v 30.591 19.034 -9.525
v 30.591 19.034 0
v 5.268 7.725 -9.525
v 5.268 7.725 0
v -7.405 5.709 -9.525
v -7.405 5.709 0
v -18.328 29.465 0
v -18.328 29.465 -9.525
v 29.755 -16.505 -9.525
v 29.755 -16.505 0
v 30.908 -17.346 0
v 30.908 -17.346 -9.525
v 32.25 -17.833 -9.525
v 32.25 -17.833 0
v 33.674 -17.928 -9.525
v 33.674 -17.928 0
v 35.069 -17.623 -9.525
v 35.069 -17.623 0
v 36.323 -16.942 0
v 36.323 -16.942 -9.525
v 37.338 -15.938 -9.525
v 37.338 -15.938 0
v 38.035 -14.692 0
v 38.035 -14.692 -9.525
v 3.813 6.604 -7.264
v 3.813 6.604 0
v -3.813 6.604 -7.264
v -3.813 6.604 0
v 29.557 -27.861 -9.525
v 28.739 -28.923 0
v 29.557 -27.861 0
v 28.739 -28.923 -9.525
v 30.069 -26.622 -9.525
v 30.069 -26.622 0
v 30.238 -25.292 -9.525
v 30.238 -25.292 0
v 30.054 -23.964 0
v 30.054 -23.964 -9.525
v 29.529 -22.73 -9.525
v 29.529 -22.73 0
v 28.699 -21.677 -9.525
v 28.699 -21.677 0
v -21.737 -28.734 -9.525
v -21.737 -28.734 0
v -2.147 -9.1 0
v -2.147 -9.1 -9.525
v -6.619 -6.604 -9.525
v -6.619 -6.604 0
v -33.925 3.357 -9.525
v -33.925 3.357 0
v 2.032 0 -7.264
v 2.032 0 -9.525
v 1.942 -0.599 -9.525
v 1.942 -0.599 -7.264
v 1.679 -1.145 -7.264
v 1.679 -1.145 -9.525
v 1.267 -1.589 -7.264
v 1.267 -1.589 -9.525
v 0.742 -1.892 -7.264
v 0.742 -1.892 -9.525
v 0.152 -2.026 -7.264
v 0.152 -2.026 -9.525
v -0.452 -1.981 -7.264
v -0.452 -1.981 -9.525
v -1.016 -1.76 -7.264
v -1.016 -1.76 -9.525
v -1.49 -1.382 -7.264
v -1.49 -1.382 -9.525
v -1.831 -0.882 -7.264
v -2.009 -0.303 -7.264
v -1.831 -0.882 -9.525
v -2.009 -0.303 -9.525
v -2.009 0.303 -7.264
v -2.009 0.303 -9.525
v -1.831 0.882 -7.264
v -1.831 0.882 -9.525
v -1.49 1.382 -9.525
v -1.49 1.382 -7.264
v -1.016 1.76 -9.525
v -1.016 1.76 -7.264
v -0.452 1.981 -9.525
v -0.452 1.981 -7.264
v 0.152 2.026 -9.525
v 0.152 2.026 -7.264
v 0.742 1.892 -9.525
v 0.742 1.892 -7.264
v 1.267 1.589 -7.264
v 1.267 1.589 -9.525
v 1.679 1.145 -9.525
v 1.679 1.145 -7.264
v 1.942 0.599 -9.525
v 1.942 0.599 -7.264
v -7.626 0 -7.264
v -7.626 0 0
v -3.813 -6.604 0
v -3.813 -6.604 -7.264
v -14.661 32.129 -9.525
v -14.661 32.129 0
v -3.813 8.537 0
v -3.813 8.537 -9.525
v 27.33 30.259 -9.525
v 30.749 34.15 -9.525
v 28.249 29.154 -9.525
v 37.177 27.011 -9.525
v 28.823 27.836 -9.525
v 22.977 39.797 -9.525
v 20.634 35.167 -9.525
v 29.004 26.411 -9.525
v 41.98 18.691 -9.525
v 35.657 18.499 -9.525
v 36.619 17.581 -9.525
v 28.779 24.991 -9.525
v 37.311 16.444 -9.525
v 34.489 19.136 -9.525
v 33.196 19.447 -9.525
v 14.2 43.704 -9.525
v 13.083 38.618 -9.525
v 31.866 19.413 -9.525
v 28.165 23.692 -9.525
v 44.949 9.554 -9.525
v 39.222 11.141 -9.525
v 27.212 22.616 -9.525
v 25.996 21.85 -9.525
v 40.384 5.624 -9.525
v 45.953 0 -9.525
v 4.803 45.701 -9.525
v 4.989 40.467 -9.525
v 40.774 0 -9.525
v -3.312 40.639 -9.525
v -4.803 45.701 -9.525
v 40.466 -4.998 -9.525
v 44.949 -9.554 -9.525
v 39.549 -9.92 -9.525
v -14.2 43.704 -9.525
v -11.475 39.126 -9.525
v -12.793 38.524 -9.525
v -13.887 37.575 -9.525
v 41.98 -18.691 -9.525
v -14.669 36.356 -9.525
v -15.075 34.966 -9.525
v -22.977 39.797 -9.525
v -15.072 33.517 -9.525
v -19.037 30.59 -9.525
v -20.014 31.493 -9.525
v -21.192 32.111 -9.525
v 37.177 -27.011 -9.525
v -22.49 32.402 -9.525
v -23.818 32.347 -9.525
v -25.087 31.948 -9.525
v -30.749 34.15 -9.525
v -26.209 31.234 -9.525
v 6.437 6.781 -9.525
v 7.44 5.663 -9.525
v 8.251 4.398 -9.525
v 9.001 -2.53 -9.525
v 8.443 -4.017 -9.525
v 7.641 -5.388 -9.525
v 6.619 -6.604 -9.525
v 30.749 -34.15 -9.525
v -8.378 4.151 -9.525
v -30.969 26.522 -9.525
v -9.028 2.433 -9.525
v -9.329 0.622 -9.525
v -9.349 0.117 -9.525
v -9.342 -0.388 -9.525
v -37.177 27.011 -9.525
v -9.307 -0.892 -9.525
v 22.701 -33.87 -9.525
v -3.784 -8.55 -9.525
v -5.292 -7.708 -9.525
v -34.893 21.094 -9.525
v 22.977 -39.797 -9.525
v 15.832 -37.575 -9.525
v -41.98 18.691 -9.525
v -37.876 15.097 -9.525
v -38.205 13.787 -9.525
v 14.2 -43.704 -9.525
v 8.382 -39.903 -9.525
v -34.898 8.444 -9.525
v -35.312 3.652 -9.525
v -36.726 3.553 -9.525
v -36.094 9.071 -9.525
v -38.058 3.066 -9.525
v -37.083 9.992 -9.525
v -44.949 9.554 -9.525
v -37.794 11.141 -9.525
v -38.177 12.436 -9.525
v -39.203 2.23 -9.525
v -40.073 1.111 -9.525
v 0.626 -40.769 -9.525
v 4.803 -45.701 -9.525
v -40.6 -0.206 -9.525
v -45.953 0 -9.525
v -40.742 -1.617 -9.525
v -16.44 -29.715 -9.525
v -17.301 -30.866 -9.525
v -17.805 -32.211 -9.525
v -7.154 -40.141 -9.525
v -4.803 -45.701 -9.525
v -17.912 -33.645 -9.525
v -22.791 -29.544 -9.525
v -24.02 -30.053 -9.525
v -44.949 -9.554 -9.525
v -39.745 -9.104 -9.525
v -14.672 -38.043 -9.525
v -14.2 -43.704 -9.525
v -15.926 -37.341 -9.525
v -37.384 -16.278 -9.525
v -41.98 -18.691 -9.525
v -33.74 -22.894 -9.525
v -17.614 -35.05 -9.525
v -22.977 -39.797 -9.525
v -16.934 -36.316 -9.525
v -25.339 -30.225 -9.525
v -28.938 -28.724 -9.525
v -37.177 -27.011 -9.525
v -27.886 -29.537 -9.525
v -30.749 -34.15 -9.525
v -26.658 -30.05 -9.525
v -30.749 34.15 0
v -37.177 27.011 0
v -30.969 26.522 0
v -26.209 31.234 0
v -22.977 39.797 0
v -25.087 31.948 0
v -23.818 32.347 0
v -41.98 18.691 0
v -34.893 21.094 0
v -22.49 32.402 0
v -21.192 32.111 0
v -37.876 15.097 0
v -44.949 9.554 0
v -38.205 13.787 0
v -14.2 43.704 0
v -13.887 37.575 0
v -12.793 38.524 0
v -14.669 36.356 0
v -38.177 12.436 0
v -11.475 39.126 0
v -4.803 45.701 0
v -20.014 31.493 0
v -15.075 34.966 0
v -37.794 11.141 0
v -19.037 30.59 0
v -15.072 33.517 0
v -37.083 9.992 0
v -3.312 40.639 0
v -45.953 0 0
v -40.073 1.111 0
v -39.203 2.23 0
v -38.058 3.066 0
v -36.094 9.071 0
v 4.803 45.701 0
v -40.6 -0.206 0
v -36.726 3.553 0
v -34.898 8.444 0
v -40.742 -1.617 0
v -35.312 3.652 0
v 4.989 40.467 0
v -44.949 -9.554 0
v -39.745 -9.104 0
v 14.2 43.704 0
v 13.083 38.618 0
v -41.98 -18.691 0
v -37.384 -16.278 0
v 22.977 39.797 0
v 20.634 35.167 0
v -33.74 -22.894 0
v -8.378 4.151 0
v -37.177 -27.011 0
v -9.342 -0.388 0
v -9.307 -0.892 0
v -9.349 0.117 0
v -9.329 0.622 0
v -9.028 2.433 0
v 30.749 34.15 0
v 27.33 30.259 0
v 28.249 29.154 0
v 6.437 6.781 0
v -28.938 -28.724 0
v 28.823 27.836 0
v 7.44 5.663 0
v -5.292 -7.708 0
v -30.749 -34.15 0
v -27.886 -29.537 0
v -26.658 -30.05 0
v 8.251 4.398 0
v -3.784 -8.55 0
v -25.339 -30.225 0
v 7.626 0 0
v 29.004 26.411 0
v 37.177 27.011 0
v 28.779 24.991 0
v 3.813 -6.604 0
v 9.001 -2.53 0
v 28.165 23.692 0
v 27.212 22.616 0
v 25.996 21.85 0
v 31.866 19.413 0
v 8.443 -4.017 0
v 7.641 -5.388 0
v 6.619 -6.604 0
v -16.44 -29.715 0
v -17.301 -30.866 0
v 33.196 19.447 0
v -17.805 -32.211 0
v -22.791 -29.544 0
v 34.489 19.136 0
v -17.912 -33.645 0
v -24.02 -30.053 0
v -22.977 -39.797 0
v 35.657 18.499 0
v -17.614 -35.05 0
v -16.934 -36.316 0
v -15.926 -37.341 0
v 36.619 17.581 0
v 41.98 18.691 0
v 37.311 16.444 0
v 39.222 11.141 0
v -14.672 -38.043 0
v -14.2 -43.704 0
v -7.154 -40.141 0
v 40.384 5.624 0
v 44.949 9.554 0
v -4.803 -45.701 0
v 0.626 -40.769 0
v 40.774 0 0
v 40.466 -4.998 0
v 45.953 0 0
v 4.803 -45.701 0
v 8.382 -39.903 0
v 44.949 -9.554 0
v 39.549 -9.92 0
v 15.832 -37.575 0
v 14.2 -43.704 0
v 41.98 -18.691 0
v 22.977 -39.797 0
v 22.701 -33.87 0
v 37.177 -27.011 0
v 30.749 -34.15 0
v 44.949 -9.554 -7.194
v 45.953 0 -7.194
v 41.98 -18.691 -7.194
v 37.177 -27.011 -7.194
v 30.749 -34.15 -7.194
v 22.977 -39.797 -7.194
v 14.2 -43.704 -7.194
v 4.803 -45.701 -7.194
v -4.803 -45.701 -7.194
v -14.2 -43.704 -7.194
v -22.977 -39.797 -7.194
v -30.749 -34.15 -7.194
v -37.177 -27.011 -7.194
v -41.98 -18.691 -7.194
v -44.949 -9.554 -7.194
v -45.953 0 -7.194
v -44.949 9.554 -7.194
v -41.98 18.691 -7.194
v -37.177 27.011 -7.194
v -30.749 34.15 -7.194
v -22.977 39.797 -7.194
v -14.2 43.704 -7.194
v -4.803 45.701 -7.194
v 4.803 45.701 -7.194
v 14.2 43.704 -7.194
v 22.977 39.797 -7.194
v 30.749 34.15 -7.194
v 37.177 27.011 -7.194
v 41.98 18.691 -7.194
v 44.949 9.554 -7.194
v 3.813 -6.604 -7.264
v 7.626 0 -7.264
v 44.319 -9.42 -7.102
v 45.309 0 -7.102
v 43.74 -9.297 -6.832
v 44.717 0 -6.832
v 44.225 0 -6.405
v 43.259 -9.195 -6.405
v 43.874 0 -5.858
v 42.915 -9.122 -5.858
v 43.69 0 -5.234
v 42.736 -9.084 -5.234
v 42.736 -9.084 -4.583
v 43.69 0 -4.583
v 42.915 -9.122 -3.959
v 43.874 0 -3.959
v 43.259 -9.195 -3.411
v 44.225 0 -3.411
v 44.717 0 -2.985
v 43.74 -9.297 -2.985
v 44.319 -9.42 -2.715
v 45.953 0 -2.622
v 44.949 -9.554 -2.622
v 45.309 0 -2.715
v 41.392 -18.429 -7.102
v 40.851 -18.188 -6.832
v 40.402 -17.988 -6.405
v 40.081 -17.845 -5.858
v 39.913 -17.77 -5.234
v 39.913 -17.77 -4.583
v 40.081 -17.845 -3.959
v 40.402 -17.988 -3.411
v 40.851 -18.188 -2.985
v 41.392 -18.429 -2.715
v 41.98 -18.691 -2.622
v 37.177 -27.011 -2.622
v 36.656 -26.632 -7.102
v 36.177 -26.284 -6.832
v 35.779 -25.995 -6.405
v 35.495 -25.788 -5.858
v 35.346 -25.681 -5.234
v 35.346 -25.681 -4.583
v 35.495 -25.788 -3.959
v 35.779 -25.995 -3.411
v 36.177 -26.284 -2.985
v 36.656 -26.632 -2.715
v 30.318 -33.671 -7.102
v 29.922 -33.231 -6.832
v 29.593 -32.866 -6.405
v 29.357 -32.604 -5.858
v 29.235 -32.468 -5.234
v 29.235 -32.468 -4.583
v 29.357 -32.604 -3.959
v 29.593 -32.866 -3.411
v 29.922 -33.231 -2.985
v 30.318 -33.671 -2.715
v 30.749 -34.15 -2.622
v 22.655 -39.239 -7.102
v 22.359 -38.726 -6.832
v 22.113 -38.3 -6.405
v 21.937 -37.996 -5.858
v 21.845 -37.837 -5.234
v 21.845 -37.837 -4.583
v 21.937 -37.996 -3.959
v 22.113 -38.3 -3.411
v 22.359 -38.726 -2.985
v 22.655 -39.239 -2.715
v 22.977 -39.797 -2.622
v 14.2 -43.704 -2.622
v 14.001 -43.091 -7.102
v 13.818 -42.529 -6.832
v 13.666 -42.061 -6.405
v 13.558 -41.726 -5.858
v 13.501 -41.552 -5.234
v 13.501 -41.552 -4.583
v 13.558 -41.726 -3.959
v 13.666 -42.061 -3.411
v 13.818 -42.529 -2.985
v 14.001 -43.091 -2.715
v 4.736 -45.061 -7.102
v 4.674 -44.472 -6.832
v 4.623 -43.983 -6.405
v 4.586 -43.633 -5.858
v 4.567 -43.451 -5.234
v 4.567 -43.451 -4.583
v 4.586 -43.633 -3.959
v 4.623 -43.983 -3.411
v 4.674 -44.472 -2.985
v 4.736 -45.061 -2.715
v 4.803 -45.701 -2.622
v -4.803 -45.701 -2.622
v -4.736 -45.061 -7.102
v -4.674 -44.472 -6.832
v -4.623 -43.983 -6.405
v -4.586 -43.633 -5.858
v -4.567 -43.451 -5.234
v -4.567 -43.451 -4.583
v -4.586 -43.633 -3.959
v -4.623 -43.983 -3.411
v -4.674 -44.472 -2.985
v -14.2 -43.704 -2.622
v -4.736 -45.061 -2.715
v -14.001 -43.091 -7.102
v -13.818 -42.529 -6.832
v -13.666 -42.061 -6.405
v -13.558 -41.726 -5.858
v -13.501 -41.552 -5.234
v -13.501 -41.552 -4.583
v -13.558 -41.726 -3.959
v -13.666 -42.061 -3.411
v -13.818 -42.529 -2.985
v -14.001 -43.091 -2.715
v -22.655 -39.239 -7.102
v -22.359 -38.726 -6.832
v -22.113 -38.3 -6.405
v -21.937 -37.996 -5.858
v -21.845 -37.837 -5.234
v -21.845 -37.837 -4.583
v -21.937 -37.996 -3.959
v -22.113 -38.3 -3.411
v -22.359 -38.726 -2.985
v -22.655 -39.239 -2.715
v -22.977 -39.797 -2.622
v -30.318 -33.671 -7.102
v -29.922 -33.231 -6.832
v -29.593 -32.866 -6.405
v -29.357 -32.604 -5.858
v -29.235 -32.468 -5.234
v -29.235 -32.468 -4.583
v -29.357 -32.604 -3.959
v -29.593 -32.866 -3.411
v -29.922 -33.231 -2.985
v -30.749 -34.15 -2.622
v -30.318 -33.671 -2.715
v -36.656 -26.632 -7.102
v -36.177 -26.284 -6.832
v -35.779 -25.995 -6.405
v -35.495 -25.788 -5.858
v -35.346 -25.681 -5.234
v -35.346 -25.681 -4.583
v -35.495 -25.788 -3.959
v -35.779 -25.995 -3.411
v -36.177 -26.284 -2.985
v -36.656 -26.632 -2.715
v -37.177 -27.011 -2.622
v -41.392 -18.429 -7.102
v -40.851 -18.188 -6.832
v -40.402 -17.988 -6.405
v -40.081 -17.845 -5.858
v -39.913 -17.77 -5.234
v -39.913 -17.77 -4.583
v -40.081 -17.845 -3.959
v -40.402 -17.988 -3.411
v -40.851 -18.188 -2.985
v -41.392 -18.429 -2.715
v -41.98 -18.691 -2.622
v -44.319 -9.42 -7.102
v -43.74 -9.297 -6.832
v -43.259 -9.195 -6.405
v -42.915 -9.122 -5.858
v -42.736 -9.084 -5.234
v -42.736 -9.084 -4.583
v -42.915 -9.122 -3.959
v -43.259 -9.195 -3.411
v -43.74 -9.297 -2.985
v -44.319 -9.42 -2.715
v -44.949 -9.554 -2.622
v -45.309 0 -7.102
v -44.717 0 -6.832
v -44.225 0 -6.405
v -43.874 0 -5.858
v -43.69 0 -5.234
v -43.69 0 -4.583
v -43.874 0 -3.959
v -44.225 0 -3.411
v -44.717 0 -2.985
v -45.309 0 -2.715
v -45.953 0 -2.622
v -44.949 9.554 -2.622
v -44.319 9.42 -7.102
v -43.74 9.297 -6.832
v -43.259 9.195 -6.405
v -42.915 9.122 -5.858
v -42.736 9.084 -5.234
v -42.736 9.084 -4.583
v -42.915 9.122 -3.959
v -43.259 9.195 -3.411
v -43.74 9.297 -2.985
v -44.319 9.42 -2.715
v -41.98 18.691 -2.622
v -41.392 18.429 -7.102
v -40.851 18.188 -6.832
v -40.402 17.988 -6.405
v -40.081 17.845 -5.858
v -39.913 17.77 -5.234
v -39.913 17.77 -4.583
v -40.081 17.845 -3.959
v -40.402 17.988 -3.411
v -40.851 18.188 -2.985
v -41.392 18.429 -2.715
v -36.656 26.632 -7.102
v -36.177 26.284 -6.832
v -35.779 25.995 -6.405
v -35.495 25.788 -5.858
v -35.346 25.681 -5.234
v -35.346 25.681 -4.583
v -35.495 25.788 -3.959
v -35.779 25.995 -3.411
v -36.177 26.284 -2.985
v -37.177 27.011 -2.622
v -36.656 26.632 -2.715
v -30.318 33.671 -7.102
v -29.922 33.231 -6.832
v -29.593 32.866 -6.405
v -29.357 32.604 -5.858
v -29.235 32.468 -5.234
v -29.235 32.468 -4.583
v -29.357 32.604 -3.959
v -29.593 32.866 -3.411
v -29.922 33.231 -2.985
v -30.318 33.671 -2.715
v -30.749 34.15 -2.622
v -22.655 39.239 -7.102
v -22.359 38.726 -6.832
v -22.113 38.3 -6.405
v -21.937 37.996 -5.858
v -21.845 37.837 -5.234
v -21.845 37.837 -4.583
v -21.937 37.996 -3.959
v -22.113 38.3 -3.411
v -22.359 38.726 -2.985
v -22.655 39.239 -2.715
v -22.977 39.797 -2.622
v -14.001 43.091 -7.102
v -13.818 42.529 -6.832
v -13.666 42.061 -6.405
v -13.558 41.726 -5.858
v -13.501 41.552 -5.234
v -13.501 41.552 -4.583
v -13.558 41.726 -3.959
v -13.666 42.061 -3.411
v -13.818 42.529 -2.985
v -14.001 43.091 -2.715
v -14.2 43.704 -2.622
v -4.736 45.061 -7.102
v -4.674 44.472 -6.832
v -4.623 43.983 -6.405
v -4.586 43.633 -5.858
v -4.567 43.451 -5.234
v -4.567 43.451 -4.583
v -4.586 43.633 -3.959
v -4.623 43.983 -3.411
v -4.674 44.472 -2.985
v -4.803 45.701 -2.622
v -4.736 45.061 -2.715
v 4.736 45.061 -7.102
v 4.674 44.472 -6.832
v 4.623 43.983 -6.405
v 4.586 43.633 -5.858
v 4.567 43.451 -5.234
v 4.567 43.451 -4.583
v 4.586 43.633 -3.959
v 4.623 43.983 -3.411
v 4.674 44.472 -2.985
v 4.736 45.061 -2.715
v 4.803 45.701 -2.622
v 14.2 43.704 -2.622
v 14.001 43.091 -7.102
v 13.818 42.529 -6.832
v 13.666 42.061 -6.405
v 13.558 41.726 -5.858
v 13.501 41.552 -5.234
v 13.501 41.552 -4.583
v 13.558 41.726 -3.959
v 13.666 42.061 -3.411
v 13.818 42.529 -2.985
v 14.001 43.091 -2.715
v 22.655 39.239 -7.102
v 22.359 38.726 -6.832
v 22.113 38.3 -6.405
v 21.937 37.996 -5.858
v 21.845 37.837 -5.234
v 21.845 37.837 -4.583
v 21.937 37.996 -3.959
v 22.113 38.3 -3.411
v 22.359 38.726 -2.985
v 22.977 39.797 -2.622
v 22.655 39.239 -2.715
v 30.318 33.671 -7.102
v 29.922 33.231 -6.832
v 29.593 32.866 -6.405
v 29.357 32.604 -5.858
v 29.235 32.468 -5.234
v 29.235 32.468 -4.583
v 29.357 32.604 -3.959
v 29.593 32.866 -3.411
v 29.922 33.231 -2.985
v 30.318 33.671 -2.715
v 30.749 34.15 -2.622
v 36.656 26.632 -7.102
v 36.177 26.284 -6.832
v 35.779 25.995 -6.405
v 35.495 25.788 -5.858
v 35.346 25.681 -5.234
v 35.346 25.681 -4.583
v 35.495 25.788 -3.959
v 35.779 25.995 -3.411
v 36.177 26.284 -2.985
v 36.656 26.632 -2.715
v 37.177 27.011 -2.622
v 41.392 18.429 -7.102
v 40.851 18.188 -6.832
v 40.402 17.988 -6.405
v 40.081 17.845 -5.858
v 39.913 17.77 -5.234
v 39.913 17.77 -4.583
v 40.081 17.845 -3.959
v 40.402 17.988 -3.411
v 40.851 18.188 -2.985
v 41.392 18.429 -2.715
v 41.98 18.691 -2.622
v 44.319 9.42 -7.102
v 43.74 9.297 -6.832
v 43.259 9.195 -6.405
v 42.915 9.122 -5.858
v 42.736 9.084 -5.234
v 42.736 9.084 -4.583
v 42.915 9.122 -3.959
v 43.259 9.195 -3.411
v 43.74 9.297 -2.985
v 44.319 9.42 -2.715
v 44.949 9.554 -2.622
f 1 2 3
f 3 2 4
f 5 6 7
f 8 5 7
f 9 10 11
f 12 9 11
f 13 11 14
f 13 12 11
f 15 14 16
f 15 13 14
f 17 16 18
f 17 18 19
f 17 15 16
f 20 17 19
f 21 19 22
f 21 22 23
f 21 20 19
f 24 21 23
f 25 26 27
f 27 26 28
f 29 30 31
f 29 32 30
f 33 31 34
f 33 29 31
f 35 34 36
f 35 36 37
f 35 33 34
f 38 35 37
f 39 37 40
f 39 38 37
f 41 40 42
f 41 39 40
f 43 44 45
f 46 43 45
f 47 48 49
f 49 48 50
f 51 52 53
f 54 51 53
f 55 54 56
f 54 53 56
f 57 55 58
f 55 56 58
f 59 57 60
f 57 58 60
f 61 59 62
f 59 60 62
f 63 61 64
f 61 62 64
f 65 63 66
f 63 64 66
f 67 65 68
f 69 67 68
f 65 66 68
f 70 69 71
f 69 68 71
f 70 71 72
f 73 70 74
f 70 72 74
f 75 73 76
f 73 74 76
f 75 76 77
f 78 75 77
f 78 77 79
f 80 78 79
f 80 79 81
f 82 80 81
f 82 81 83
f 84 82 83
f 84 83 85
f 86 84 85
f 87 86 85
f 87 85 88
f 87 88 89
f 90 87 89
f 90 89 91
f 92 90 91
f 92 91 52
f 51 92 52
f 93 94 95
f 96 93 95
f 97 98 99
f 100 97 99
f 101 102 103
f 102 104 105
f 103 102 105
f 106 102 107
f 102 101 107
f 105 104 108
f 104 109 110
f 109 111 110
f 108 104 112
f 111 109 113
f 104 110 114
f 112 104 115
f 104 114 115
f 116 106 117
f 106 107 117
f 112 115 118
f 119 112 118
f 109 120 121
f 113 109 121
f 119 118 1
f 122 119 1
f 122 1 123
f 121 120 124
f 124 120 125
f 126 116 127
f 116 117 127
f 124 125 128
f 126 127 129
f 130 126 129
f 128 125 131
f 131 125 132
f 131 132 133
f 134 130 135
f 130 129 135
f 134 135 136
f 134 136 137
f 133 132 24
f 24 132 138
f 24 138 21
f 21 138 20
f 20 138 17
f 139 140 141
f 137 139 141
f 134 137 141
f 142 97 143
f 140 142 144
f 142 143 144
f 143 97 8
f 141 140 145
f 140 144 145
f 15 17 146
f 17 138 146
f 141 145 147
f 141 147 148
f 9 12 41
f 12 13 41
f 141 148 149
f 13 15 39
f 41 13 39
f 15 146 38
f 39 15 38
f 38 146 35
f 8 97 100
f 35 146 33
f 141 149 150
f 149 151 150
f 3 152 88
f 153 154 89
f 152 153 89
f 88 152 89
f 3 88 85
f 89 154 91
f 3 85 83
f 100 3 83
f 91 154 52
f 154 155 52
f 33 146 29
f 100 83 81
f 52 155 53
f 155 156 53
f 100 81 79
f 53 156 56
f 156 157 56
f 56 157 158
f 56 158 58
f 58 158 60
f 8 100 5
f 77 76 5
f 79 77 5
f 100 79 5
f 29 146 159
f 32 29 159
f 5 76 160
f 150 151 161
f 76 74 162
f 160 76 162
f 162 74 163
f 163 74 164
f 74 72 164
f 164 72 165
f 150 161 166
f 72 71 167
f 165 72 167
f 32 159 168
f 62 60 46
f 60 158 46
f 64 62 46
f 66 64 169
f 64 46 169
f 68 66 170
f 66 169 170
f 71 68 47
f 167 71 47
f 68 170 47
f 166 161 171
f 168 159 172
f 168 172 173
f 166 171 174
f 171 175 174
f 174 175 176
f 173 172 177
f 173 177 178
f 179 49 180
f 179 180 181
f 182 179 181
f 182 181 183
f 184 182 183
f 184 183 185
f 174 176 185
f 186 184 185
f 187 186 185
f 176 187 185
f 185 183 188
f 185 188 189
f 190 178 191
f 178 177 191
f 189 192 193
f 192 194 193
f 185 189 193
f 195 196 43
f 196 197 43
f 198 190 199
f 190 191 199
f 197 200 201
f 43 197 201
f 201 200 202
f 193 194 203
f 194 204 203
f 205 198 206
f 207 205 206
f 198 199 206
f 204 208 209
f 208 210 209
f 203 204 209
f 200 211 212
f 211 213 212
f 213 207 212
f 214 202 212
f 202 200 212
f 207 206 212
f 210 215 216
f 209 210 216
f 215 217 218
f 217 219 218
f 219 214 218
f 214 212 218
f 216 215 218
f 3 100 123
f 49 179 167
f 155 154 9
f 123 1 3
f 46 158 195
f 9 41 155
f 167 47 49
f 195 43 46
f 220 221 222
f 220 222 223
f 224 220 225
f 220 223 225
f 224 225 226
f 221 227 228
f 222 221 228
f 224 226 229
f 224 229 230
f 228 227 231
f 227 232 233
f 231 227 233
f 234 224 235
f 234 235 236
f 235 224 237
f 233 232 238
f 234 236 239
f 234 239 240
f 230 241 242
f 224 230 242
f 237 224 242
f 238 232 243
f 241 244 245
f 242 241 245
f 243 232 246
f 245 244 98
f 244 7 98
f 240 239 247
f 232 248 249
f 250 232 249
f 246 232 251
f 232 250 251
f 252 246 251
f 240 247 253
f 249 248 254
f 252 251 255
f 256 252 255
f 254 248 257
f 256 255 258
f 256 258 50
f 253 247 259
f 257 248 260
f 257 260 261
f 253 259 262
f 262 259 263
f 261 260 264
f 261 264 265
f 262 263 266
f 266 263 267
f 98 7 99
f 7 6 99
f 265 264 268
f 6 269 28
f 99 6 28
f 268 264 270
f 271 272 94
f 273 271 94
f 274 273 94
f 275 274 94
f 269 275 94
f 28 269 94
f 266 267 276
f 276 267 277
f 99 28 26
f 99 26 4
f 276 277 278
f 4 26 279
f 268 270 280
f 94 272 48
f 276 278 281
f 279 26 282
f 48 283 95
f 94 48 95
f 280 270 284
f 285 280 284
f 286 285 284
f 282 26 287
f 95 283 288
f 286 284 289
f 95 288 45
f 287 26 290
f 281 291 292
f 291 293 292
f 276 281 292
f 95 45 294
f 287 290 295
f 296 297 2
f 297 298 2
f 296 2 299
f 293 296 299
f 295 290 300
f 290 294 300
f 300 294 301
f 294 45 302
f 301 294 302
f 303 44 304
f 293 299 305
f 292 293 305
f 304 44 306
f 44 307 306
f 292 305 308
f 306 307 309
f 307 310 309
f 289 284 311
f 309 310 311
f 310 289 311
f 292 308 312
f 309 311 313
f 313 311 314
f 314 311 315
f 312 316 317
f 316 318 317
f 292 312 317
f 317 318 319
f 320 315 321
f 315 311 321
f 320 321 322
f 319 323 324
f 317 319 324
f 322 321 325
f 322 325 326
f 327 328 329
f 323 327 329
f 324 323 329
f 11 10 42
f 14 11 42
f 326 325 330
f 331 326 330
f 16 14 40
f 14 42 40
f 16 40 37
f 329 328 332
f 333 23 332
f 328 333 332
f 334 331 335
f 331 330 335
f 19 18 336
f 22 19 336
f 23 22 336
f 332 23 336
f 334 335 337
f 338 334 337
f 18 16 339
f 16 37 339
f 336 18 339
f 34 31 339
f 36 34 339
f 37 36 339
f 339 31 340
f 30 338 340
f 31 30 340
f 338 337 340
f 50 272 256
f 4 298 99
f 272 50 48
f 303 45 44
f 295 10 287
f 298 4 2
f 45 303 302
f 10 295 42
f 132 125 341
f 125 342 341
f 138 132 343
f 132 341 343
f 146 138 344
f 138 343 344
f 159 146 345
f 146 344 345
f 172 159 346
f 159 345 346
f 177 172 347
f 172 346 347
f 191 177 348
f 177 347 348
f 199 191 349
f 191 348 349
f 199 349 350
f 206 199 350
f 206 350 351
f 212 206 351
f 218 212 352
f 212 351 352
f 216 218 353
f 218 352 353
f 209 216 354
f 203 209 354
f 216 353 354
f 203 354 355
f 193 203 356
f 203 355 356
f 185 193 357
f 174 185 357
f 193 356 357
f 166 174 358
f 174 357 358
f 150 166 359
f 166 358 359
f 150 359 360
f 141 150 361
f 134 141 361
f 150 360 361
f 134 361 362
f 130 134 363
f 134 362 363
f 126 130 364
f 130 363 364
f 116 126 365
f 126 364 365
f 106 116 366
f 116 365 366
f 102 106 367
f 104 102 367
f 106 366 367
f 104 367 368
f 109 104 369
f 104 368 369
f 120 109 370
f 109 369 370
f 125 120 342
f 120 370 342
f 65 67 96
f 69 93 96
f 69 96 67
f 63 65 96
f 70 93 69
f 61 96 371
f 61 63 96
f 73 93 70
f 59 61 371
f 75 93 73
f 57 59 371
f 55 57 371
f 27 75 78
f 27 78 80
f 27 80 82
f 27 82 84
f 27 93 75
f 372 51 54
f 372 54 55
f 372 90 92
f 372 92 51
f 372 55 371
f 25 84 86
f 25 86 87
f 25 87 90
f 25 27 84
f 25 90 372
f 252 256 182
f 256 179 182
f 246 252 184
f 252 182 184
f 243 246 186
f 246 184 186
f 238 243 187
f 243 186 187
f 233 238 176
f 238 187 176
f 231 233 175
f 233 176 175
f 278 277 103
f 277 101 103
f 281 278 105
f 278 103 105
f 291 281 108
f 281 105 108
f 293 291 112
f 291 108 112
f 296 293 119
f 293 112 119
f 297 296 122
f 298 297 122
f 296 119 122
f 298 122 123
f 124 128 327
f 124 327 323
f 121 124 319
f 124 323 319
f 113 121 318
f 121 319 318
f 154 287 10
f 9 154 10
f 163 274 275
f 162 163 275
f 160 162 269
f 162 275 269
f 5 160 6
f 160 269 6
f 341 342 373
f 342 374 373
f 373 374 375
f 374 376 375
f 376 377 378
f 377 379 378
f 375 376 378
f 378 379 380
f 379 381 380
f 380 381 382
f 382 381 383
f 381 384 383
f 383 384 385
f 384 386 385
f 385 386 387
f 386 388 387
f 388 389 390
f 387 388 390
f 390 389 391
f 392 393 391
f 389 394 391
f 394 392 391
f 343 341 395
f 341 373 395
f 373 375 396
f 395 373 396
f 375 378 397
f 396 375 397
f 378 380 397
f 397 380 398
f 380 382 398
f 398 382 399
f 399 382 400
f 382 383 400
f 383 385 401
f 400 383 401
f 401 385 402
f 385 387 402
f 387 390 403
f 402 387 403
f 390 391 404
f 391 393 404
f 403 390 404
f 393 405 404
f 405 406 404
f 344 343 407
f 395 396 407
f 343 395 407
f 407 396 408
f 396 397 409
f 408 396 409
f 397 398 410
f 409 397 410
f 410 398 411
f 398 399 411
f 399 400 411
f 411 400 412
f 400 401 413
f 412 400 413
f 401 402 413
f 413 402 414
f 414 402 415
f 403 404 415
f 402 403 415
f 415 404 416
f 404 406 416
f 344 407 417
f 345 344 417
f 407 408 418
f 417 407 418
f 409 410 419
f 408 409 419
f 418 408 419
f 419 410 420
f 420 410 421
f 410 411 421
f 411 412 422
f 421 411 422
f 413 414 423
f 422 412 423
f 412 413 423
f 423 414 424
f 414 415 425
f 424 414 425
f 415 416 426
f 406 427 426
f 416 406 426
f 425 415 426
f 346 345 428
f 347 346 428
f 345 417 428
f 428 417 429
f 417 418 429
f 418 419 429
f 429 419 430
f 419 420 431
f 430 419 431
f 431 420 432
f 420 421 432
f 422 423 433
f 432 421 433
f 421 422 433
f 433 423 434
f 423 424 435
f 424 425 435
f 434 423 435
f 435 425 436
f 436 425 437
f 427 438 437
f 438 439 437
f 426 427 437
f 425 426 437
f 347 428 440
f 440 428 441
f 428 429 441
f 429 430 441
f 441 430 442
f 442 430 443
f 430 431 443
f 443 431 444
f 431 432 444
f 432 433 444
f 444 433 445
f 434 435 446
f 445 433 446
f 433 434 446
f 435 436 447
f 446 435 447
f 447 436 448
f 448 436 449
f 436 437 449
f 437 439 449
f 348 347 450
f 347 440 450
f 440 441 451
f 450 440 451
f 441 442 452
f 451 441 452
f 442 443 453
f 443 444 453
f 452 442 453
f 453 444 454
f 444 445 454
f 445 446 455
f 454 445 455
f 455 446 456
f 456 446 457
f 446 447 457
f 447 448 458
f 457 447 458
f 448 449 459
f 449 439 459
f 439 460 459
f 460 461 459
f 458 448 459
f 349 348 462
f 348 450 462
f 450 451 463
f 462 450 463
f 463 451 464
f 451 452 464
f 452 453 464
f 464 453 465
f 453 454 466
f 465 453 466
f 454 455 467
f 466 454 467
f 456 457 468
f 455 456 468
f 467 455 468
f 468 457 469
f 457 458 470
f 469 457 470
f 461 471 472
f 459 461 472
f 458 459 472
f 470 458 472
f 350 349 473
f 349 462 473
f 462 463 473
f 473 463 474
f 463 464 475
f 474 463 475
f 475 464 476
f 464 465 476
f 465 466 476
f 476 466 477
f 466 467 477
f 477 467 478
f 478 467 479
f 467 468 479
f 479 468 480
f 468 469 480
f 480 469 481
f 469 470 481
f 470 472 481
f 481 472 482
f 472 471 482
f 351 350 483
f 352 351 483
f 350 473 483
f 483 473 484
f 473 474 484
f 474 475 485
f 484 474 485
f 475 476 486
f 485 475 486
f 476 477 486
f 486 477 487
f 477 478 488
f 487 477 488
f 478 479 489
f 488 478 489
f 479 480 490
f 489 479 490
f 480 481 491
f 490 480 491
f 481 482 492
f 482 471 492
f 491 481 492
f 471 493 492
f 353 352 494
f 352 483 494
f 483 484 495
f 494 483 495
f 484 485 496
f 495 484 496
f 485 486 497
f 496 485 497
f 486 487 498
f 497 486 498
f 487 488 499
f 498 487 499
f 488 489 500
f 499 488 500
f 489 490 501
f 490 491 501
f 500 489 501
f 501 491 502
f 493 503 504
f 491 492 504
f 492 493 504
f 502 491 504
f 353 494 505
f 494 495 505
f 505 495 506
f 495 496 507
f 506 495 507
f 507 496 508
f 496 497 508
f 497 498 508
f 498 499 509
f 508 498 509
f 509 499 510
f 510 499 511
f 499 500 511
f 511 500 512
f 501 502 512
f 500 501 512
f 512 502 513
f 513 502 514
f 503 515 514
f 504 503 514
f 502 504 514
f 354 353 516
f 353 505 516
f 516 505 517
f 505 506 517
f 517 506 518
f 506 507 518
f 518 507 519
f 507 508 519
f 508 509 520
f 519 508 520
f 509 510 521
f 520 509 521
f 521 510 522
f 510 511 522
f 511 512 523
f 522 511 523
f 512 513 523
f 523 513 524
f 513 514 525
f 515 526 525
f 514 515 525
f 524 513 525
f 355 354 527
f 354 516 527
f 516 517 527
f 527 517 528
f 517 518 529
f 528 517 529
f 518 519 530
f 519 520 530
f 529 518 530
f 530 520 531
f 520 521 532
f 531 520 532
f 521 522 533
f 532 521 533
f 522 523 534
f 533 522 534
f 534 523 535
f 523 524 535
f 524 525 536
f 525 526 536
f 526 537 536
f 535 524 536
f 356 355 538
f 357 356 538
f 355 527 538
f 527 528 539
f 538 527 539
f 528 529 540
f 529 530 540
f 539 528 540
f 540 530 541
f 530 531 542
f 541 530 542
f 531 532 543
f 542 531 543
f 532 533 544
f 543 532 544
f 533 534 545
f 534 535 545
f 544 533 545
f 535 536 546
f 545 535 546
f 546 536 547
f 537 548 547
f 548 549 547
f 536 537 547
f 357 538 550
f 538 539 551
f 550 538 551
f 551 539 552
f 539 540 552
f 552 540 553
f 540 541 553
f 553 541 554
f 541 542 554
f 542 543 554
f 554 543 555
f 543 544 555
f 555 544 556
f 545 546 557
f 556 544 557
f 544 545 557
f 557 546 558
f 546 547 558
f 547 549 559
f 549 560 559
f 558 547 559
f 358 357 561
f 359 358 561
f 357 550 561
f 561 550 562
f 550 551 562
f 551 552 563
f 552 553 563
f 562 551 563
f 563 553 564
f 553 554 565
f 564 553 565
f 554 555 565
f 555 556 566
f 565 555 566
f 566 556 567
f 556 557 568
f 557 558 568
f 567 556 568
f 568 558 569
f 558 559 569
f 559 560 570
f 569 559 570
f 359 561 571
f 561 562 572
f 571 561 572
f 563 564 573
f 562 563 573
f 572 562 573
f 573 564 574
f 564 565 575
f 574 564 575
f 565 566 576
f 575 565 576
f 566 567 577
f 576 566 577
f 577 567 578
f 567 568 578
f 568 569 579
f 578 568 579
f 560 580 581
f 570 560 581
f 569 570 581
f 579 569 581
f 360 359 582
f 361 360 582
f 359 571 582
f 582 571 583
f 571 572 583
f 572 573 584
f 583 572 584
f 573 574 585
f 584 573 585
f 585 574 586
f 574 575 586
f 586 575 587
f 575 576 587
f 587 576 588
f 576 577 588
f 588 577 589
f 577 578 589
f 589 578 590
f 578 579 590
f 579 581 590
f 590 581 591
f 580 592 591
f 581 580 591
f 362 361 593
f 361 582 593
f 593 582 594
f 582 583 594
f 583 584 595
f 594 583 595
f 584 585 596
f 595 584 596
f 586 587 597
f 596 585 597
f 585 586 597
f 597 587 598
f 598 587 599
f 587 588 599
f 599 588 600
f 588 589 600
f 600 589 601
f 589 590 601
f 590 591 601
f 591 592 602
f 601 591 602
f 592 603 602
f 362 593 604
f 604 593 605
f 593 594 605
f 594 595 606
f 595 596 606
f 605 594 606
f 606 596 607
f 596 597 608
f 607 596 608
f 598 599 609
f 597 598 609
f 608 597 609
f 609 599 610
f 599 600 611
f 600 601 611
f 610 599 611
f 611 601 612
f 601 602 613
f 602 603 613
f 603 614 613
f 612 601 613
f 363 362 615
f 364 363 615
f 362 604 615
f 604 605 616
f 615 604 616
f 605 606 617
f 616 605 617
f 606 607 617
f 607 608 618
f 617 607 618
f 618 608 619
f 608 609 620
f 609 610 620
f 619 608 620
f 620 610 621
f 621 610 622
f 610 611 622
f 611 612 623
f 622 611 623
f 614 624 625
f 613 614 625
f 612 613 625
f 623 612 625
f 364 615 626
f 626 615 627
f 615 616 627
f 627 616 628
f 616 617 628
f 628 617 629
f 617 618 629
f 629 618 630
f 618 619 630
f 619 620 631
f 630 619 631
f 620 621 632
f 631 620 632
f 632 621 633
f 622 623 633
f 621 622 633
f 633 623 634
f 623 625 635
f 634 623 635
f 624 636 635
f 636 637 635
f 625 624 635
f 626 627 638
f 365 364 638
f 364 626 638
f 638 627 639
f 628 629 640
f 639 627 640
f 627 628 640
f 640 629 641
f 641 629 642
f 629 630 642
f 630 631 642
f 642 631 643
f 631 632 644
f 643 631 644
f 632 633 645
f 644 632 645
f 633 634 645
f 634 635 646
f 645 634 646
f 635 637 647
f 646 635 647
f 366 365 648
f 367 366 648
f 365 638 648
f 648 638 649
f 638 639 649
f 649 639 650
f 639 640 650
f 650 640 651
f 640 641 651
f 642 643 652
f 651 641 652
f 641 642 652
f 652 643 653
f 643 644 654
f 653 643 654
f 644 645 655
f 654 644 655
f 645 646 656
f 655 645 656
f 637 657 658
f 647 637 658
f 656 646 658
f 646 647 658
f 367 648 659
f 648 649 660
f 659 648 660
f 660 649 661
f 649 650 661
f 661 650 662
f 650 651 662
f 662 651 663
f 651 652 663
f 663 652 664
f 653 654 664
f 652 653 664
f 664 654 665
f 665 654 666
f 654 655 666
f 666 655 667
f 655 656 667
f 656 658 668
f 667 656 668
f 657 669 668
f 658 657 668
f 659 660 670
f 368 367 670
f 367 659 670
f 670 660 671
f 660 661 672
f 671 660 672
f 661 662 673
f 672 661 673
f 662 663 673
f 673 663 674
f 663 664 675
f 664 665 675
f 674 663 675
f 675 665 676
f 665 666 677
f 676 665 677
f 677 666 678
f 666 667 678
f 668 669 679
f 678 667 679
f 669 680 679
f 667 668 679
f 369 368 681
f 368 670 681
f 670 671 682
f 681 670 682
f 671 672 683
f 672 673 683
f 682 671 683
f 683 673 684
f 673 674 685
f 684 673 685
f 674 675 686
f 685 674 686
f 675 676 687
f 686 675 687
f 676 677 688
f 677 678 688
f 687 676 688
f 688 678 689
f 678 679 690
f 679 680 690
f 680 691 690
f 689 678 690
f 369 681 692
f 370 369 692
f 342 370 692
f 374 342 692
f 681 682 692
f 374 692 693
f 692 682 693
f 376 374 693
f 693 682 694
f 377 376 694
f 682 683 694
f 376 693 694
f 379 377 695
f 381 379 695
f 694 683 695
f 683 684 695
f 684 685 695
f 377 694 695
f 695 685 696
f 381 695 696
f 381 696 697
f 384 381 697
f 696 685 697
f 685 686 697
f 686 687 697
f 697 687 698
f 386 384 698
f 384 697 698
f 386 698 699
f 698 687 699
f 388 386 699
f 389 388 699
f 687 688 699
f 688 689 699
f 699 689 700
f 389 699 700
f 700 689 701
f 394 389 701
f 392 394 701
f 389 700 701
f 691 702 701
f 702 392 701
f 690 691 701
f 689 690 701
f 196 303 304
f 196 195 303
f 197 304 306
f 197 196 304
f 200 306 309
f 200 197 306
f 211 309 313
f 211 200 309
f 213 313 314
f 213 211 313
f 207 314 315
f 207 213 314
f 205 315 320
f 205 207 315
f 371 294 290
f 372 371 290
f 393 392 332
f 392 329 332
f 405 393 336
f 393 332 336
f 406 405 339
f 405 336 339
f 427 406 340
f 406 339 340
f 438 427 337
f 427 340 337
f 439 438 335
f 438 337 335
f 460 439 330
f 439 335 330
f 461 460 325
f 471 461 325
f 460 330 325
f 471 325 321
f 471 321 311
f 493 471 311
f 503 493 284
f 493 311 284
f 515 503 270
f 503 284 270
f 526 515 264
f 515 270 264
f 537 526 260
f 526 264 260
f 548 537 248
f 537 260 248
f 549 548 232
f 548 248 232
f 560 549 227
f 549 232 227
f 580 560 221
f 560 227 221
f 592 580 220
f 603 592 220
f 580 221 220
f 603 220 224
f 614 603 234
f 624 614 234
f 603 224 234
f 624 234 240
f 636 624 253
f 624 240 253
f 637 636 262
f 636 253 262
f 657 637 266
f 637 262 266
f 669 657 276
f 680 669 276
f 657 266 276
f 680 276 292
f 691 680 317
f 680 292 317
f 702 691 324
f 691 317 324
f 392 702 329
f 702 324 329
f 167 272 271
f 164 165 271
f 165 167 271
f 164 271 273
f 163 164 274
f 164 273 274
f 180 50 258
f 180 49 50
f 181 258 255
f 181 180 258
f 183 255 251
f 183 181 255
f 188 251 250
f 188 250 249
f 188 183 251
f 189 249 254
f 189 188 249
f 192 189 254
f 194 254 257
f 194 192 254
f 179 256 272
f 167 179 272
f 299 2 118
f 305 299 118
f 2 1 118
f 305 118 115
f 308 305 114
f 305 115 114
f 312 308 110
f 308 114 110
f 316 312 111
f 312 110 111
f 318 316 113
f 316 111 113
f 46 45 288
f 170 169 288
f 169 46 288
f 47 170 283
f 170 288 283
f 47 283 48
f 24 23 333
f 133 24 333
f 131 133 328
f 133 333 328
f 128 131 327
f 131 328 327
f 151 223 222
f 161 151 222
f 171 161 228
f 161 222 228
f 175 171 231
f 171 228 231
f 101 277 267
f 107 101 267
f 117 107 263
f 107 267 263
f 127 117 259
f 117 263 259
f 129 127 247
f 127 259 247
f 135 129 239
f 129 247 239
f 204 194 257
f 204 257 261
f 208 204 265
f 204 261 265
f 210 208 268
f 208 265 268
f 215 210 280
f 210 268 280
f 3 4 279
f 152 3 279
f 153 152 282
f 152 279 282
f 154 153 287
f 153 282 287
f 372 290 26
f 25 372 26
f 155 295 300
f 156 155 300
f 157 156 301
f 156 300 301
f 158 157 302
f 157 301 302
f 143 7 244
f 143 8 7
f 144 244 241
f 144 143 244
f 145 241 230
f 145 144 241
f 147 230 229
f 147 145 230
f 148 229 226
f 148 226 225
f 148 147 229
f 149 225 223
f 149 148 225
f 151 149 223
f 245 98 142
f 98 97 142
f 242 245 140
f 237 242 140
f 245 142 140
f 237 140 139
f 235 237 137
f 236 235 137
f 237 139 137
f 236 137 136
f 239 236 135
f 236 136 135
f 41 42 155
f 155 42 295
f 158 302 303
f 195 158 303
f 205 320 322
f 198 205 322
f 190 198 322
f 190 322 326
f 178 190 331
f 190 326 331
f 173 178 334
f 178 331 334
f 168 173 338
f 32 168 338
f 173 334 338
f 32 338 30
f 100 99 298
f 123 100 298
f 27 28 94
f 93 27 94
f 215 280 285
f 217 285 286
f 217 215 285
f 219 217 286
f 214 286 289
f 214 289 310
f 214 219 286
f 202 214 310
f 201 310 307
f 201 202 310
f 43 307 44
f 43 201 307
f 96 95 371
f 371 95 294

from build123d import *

# Parameters (mm, degrees)
F3_R     = 2.032
F4_DEPTH = 9.526
F5_DEPTH = 9.526
F6_DEPTH = 7.2644
F7_R     = 5.08


with BuildPart() as f2:
    # F1 (on Front) → F2 (revolve)
    with BuildSketch(Plane.XZ):
        with BuildLine():
            Line((45.953082, -2.622399), (45.953082, 0))
            Line((45.953082, 0), (0, 0))
            Line((0, 0), (0, -9.525))
            Line((0, -9.525), (45.953082, -9.525))
            Line((45.953082, -9.525), (45.953082, -7.194399))
            ThreePointArc((45.953082, -7.194399), (43.667082, -4.908399), (45.953082, -2.622399))
        make_face()
    revolve(axis=Axis((0, 0, -4.7625), (0, 0, -1)))

    # F3 (on face) → F4 (cut, through all)
    with BuildSketch(Plane(origin=(0, 0, -9.525), x_dir=(1, 0, 0), z_dir=(0, 0, -1))):
        Circle(F3_R)
    extrude(amount=-F4_DEPTH, mode=Mode.SUBTRACT)

    # F0 (on Top) → F5 (cut, through all)
    with BuildSketch(Plane.XY):
        with BuildLine():
            Line((-3.812821, 8.537283), (32.424712, 24.721265))
            ThreePointArc((32.424712, 24.721265), (9.907948, 39.551681), (-16.941164, 37.087731))
            Line((-16.941164, 37.087731), (-3.812821, 8.537283))
        make_face()
        with BuildLine():
            Line((-7.404719, 5.709023), (-20.882838, 35.020136))
            ThreePointArc((-20.882838, 35.020136), (-32.656298, 24.414526), (-39.497569, 10.121508))
            Line((-39.497569, 10.121508), (-9.307396, -0.891727))
            ThreePointArc((-9.307396, -0.891727), (-9.349033, -0.135558), (-9.329338, 0.6215))
            ThreePointArc((-9.329338, 0.6215), (-8.745163, 3.308311), (-7.404719, 5.709023))
        make_face()
        with BuildLine():
            ThreePointArc((-40.372143, 5.709023), (-37.814361, -15.250474), (-25.115689, -32.120165))
            Line((-25.115689, -32.120165), (-2.147453, -9.100069))
            ThreePointArc((-2.147453, -9.100069), (-4.557398, -8.164124), (-6.618911, -6.604))
            Line((-6.618911, -6.604), (-40.372143, 5.709023))
        make_face()
        with BuildLine():
            ThreePointArc((-21.412568, -34.698772), (7.22509, -40.128555), (32.170471, -25.051221))
            Line((32.170471, -25.051221), (9.001197, -2.530069))
            ThreePointArc((9.001197, -2.530069), (8.071318, -4.719812), (6.618911, -6.604))
            Line((6.618911, -6.604), (-21.412568, -34.698772))
        make_face()
        with BuildLine():
            ThreePointArc((34.738316, -21.348355), (39.235928, -11.092558), (40.773801, 0))
            ThreePointArc((40.773801, 0), (39.293229, 10.887838), (34.959038, 20.98496))
            Line((34.959038, 20.98496), (5.268002, 7.724698))
            ThreePointArc((5.268002, 7.724698), (6.961236, 6.242114), (8.251151, 4.397876))
            Line((8.251151, 4.397876), (34.738316, -21.348355))
        make_face()
    extrude(amount=-F5_DEPTH, mode=Mode.SUBTRACT)

    # F0 (on Top) → F6 (cut)
    with BuildSketch(Plane.XY):
        Polygon((-3.812821, 6.604), (-7.625642, 0), (-3.812821, -6.604), (3.812821, -6.604), (7.625642, 0), (3.812821, 6.604), align=None)
    extrude(amount=-F6_DEPTH, mode=Mode.SUBTRACT)

    # F7
    f7_edges = [f2.edges().sort_by_distance(p)[0] for p in [
        (34.959038, 20.98496, -4.7625),
        (32.424712, 24.721265, -4.7625),
        (-16.941164, 37.087731, -4.7625),
        (-20.882838, 35.020136, -4.7625),
        (-39.497569, 10.121508, -4.7625),
        (-40.372143, 5.709023, -4.7625),
        (-21.412568, -34.698772, -4.7625),
        (-25.115689, -32.120165, -4.7625),
        (32.170471, -25.051221, -4.7625),
        (34.738316, -21.348355, -4.7625),
    ]]
    fillet(f7_edges, radius=F7_R)


solid = f2.part
